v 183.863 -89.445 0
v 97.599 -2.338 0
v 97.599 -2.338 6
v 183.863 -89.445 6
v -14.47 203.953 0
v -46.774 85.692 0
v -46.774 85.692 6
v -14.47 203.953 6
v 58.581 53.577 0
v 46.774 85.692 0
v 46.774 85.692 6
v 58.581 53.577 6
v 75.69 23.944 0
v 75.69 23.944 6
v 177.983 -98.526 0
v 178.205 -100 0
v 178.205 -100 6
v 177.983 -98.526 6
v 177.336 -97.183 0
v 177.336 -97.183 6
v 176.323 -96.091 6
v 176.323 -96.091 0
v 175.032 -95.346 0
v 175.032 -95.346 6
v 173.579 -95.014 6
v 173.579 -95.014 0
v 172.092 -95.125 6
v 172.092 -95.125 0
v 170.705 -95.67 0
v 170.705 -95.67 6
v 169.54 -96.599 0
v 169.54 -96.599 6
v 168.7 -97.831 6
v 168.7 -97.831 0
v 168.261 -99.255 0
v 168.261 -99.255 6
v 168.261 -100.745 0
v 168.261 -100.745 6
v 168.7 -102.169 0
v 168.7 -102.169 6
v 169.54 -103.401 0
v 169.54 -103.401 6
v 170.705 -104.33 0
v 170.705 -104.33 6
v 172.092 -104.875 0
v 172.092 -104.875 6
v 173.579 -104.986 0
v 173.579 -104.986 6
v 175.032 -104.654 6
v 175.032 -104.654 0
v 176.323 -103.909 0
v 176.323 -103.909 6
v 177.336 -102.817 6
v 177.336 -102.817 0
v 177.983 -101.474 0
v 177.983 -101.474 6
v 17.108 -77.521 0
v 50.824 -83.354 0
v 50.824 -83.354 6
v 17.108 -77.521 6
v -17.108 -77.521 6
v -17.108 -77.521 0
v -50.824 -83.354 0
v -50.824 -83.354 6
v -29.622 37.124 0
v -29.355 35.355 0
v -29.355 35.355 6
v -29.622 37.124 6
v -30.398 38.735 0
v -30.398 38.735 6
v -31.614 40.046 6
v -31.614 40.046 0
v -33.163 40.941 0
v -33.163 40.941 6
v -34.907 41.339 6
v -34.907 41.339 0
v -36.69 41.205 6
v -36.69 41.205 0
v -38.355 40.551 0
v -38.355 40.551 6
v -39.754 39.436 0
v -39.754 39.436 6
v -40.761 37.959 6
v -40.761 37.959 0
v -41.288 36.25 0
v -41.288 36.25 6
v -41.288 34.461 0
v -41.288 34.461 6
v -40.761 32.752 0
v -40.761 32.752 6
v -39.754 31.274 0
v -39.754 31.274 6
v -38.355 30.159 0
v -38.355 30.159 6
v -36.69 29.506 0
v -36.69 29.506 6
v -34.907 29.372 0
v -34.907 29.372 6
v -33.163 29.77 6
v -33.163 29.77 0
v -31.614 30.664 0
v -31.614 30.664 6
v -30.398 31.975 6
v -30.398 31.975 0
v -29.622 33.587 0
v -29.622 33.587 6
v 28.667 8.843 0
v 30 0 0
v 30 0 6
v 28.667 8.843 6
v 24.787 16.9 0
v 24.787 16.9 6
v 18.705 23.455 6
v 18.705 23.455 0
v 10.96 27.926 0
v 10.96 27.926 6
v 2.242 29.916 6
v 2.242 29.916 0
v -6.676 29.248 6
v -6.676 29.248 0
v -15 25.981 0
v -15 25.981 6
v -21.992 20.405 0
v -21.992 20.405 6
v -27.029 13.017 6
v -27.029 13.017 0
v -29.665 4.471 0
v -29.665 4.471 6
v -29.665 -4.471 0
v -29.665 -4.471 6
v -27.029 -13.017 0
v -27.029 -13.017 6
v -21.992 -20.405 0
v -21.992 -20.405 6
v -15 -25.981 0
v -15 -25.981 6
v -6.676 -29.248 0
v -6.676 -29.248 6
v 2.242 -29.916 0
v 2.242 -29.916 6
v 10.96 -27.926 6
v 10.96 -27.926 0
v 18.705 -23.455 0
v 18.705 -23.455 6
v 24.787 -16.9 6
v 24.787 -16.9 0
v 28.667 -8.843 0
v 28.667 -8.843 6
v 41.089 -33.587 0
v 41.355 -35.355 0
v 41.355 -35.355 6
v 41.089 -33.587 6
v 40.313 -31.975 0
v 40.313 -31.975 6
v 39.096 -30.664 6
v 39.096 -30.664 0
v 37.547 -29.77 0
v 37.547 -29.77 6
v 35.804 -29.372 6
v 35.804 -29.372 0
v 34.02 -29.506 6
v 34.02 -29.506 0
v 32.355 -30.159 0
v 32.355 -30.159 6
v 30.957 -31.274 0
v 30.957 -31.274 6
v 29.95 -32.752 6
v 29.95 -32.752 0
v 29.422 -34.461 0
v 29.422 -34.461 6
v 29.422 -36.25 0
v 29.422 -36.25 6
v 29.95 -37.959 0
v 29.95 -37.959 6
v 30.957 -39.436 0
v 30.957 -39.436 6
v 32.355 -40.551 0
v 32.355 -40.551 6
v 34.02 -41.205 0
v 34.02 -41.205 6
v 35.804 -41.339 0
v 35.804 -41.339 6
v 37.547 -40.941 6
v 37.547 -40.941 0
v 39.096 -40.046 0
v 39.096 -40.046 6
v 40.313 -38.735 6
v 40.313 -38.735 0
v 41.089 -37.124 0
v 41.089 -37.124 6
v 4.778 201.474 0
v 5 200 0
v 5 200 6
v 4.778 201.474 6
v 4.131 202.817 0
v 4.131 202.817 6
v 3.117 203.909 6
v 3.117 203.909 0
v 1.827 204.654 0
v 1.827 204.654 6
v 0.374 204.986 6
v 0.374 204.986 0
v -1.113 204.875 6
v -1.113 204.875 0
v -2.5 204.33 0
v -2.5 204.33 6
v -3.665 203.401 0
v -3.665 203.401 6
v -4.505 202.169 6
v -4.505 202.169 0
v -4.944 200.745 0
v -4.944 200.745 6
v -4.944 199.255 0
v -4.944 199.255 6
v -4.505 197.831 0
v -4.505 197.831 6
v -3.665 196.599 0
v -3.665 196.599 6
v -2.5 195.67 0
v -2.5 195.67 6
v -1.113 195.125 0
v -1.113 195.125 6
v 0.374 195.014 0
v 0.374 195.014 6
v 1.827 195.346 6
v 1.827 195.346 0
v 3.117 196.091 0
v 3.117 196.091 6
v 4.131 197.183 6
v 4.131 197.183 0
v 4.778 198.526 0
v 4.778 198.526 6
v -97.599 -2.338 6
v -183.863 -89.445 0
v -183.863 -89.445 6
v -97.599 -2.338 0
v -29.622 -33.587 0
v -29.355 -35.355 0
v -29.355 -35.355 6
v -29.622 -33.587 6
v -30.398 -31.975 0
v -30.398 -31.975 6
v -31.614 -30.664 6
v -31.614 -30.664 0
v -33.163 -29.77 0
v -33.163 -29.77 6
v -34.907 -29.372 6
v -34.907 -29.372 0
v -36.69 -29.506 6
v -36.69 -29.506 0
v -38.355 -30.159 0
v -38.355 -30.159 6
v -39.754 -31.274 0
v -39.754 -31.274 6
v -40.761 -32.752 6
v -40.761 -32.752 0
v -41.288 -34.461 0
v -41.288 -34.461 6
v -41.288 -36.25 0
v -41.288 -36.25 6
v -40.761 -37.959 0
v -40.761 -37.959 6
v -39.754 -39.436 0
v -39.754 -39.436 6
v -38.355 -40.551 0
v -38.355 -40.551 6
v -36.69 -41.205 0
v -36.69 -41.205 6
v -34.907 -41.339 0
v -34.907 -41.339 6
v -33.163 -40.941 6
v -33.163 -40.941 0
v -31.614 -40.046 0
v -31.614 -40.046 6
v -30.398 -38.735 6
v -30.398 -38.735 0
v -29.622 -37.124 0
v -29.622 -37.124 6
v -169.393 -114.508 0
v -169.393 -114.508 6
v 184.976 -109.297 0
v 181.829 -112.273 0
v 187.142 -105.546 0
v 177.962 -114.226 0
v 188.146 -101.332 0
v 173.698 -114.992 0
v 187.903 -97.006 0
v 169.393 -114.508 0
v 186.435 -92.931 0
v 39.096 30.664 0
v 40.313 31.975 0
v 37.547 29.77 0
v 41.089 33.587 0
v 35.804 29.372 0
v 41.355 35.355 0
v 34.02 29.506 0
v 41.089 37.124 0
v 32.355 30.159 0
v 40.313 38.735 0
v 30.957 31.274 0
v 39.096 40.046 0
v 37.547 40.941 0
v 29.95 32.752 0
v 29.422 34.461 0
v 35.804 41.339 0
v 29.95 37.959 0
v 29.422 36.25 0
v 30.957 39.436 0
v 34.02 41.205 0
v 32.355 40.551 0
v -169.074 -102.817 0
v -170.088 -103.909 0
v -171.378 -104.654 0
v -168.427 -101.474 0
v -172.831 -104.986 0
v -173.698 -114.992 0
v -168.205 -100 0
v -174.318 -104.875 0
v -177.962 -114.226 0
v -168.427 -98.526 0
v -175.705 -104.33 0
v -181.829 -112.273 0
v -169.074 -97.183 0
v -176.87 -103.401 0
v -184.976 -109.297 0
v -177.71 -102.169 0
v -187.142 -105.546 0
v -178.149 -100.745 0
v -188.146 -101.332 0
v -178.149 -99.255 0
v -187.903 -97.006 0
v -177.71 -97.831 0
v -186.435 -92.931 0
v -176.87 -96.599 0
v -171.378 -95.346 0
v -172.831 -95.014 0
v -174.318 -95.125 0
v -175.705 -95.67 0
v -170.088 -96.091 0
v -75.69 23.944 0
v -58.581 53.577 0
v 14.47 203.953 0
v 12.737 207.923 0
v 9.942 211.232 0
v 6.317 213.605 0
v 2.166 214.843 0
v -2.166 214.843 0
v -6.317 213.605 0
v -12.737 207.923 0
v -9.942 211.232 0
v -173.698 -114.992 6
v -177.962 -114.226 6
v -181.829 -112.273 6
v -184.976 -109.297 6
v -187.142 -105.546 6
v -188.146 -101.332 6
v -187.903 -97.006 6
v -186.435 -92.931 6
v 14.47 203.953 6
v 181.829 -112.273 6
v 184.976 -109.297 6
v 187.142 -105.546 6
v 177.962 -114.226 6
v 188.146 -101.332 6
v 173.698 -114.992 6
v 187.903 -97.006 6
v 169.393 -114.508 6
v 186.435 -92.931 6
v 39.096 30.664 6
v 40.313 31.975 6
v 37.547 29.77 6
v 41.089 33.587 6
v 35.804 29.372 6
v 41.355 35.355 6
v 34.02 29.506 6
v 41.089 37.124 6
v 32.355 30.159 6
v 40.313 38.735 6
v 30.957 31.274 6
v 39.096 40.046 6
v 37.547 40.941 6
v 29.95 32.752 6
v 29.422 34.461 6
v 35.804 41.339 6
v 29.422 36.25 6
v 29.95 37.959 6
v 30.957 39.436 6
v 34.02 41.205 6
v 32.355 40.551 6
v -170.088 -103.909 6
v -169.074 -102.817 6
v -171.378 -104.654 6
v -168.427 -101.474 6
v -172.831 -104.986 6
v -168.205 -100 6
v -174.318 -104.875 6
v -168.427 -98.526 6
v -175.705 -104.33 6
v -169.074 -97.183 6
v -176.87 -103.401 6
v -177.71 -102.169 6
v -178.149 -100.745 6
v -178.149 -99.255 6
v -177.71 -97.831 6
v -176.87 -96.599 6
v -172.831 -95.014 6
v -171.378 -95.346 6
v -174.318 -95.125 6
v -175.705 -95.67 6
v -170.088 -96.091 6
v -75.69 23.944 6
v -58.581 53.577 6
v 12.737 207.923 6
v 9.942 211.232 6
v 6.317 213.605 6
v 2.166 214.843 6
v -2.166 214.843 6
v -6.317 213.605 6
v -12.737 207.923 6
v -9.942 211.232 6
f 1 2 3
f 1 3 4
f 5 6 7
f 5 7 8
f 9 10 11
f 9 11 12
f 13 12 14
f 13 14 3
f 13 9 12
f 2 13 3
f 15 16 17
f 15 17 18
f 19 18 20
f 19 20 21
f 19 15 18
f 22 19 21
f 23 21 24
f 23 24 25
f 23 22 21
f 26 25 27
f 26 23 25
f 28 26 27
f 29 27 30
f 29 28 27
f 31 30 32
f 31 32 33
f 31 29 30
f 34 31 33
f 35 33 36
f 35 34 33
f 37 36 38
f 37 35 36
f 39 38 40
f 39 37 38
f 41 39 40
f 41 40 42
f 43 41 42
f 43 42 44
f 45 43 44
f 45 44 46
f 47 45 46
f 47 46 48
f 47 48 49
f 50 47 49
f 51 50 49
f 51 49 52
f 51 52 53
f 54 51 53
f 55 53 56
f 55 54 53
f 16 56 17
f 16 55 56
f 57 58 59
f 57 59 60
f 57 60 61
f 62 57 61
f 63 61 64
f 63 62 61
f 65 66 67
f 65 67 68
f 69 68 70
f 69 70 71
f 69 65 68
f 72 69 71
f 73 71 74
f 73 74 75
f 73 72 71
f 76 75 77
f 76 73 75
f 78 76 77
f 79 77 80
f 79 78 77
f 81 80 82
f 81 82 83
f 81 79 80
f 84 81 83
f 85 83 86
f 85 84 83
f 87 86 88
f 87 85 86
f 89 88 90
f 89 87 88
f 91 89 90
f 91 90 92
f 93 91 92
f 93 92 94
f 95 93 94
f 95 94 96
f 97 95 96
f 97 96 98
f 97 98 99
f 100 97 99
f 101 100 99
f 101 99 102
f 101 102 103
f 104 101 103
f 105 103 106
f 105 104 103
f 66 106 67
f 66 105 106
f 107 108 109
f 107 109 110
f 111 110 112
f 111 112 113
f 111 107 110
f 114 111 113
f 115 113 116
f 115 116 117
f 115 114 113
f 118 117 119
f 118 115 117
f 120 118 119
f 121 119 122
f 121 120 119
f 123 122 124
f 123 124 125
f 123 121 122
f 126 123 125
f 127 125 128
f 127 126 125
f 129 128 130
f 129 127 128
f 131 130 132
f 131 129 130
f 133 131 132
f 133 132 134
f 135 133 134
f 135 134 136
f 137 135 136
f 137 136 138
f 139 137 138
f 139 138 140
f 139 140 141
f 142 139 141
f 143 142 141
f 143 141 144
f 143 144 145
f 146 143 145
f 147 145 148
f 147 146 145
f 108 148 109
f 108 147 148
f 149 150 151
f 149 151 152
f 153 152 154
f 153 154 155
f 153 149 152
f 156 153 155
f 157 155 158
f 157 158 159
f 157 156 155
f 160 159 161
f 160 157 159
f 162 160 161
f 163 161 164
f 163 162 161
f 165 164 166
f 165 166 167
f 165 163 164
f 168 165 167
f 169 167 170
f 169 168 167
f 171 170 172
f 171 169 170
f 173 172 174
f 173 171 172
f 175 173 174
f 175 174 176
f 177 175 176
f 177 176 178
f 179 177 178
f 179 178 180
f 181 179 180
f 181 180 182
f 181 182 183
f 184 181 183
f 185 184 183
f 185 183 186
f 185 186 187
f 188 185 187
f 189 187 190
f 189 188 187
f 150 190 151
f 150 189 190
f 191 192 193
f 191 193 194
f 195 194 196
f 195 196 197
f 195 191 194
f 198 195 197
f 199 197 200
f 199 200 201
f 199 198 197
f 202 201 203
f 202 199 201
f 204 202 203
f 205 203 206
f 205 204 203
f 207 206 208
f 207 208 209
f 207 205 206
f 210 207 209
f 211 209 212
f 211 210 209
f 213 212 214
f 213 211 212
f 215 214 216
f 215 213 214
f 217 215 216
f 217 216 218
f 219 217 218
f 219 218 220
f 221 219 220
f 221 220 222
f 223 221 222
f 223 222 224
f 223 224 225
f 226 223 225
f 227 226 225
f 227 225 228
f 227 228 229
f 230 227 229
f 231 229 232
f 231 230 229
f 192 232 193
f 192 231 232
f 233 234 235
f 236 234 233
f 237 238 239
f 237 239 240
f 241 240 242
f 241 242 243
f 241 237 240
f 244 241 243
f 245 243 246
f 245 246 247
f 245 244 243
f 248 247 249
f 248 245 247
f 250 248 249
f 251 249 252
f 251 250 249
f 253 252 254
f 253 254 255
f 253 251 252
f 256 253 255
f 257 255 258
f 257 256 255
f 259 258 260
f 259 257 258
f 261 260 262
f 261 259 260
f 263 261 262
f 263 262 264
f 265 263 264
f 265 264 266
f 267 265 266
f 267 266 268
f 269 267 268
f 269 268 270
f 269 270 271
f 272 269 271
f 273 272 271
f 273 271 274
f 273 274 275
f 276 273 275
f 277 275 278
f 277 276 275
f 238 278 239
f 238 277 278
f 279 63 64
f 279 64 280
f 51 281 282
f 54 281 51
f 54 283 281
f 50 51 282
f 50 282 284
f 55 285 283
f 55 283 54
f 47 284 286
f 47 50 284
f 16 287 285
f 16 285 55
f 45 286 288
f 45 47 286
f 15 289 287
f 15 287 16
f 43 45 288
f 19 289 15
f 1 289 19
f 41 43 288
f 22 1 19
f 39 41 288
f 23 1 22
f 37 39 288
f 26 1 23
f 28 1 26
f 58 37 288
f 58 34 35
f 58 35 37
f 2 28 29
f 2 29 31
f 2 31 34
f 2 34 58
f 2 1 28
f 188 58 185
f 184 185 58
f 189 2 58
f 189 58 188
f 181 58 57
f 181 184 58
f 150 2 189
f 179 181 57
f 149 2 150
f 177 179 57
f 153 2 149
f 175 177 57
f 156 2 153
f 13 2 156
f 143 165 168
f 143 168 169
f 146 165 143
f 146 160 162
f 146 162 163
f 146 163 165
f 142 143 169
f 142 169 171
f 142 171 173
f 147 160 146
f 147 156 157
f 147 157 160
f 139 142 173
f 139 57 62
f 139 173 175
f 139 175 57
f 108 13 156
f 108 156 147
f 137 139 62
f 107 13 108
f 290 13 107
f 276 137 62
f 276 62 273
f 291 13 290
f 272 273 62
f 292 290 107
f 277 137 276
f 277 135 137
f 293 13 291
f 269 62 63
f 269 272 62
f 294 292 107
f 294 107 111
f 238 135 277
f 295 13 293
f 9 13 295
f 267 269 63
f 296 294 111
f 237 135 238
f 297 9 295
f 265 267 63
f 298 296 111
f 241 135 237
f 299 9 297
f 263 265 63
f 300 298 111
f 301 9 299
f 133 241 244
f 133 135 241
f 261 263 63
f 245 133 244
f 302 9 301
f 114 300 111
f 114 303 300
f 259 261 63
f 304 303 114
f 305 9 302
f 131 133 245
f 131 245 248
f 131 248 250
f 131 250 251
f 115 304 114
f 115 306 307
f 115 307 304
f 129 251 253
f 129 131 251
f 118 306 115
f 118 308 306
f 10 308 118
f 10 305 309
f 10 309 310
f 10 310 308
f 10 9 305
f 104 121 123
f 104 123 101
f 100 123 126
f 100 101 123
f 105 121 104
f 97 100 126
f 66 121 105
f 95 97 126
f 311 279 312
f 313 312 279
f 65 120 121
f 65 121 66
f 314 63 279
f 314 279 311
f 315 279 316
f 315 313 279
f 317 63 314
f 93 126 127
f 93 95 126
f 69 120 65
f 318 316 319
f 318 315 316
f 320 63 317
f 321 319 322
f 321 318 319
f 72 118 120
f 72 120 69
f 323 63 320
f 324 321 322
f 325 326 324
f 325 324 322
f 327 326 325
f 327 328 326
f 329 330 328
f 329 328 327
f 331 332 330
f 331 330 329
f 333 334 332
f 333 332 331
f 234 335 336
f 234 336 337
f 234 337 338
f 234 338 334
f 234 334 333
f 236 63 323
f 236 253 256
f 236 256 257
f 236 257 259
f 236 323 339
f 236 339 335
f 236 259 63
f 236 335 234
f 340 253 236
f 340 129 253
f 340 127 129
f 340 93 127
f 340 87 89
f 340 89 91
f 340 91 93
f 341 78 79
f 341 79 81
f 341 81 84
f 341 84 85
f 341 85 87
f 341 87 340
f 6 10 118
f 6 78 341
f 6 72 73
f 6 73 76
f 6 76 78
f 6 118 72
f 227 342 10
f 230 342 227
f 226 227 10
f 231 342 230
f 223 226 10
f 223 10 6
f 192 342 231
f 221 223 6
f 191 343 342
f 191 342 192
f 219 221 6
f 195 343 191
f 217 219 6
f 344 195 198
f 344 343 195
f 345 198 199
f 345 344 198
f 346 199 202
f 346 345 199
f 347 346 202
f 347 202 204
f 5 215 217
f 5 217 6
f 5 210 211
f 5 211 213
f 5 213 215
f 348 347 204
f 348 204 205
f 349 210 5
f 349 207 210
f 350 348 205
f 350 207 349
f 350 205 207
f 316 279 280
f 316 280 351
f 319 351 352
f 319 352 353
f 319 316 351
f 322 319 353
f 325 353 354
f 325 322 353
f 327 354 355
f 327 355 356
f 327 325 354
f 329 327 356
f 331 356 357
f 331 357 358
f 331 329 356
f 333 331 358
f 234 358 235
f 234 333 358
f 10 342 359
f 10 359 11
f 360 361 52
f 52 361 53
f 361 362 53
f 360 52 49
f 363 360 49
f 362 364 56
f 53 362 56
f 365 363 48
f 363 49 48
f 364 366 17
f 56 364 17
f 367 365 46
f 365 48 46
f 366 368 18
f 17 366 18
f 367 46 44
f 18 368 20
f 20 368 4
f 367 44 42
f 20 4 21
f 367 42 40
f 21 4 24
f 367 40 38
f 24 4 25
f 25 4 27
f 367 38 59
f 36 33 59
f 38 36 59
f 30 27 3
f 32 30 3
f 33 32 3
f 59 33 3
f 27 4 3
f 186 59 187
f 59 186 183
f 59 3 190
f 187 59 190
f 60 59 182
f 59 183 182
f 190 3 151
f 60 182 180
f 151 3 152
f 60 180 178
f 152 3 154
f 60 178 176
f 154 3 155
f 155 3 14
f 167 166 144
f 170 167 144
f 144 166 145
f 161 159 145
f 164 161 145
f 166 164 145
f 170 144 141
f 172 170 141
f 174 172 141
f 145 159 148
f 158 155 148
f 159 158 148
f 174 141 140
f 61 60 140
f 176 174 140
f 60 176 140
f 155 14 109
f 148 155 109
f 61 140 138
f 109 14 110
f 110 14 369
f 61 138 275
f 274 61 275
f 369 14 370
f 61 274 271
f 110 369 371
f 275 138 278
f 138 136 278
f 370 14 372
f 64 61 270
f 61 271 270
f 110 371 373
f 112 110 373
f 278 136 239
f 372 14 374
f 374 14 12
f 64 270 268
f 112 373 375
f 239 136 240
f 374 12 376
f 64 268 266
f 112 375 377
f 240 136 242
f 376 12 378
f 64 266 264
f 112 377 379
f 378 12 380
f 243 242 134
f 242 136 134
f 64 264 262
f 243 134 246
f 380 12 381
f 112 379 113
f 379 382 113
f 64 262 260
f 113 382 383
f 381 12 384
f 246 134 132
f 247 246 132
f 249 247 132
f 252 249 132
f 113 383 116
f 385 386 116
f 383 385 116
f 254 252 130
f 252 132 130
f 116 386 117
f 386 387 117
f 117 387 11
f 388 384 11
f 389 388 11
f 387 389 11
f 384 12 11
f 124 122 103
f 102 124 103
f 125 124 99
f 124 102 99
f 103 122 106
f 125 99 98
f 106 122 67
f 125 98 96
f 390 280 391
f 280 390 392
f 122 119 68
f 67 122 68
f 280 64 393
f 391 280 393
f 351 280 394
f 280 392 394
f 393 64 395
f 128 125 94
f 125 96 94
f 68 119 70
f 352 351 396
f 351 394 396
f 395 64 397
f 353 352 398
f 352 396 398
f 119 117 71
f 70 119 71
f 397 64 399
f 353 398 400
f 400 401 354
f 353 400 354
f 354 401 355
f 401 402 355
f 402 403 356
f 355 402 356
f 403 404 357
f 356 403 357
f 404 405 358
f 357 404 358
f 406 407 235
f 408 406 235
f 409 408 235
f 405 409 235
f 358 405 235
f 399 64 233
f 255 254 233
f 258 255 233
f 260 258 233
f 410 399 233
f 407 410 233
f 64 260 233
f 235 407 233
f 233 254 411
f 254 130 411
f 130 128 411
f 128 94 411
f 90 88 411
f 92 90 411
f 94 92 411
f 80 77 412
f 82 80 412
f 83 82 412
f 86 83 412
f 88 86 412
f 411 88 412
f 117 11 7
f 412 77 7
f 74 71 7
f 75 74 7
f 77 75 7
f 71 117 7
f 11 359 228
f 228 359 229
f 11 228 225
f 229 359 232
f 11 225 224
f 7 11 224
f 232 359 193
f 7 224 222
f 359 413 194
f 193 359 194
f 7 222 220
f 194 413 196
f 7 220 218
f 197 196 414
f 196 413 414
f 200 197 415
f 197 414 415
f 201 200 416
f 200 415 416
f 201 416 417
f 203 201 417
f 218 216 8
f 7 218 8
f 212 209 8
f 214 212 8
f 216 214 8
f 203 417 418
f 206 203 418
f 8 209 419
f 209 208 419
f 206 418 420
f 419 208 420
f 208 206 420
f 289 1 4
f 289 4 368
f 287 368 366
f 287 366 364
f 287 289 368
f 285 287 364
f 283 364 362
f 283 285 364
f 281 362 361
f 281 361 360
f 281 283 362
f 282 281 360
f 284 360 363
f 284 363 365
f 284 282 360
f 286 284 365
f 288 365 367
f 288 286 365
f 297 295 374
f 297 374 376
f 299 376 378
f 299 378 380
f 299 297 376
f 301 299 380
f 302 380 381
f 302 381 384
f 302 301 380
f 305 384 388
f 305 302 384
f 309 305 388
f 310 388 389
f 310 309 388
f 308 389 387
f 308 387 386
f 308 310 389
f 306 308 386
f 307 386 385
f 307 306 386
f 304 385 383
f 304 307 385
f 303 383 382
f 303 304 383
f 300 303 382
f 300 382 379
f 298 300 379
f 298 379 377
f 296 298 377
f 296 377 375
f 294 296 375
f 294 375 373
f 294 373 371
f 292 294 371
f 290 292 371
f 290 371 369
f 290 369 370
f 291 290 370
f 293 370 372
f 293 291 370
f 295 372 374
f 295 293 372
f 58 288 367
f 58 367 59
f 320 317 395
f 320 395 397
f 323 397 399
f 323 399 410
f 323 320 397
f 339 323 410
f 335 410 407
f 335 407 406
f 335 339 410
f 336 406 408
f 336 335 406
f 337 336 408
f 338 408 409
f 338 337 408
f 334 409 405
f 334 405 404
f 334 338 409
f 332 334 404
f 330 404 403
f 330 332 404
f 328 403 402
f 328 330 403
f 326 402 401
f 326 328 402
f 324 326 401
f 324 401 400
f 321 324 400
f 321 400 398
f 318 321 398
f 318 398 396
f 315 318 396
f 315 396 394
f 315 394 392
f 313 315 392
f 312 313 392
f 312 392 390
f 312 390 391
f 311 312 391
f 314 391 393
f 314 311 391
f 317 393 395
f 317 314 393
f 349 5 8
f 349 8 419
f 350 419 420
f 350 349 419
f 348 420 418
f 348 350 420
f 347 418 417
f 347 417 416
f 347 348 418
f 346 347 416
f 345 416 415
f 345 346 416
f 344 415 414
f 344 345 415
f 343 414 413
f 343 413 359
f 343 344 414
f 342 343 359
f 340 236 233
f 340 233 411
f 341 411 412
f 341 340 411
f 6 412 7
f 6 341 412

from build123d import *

# Parameters (mm, degrees)
SKETCH1_R           = 5
SKETCH1_R_2         = 6
SKETCH1_R_3         = 30
BOSS_EXTRUDE1_DEPTH = 6


with BuildPart() as part:
    # Sketch1 → Boss-Extrude1 (new body)
    with BuildSketch(Plane.XY):
        with BuildLine():
            Line((-183.863104209, -89.445070531), (-97.598804033, -2.338194347))
            ThreePointArc((-97.598804033, -2.338194347), (-66.500702639, 38.39419857), (-46.774466313, 85.692140845))
            Line((-46.774466313, 85.692140845), (-14.469848781, 203.952654329))
            ThreePointArc((-14.469848781, 203.952654329), (0, 215), (14.469848781, 203.952654329))
            Line((14.469848781, 203.952654329), (46.774466313, 85.692140845))
            ThreePointArc((46.774466313, 85.692140845), (66.500702639, 38.39419857), (97.598804033, -2.338194347))
            Line((97.598804033, -2.338194347), (183.863104209, -89.445070531))
            ThreePointArc((183.863104209, -89.445070531), (186.195461814, -107.5), (169.393255428, -114.507583798))
            Line((169.393255428, -114.507583798), (50.82433772, -83.353946498))
            ThreePointArc((50.82433772, -83.353946498), (0, -76.78839714), (-50.82433772, -83.353946498))
            Line((-50.82433772, -83.353946498), (-169.393255428, -114.507583798))
            ThreePointArc((-169.393255428, -114.507583798), (-186.195461814, -107.5), (-183.863104209, -89.445070531))
        make_face()
        with Locations((0, 200)):
            Circle(SKETCH1_R, mode=Mode.SUBTRACT)
        with Locations((173.205080757, -100)):
            Circle(SKETCH1_R, mode=Mode.SUBTRACT)
        with Locations((-173.205080757, -100)):
            Circle(SKETCH1_R, mode=Mode.SUBTRACT)
        with Locations((-35.355339059, 35.355339059)):
            Circle(SKETCH1_R_2, mode=Mode.SUBTRACT)
        with Locations((35.355339059, 35.355339059)):
            Circle(SKETCH1_R_2, mode=Mode.SUBTRACT)
        with Locations((35.355339059, -35.355339059)):
            Circle(SKETCH1_R_2, mode=Mode.SUBTRACT)
        with Locations((-35.355339059, -35.355339059)):
            Circle(SKETCH1_R_2, mode=Mode.SUBTRACT)
        Circle(SKETCH1_R_3, mode=Mode.SUBTRACT)
    extrude(amount=BOSS_EXTRUDE1_DEPTH)


solid = part.part
